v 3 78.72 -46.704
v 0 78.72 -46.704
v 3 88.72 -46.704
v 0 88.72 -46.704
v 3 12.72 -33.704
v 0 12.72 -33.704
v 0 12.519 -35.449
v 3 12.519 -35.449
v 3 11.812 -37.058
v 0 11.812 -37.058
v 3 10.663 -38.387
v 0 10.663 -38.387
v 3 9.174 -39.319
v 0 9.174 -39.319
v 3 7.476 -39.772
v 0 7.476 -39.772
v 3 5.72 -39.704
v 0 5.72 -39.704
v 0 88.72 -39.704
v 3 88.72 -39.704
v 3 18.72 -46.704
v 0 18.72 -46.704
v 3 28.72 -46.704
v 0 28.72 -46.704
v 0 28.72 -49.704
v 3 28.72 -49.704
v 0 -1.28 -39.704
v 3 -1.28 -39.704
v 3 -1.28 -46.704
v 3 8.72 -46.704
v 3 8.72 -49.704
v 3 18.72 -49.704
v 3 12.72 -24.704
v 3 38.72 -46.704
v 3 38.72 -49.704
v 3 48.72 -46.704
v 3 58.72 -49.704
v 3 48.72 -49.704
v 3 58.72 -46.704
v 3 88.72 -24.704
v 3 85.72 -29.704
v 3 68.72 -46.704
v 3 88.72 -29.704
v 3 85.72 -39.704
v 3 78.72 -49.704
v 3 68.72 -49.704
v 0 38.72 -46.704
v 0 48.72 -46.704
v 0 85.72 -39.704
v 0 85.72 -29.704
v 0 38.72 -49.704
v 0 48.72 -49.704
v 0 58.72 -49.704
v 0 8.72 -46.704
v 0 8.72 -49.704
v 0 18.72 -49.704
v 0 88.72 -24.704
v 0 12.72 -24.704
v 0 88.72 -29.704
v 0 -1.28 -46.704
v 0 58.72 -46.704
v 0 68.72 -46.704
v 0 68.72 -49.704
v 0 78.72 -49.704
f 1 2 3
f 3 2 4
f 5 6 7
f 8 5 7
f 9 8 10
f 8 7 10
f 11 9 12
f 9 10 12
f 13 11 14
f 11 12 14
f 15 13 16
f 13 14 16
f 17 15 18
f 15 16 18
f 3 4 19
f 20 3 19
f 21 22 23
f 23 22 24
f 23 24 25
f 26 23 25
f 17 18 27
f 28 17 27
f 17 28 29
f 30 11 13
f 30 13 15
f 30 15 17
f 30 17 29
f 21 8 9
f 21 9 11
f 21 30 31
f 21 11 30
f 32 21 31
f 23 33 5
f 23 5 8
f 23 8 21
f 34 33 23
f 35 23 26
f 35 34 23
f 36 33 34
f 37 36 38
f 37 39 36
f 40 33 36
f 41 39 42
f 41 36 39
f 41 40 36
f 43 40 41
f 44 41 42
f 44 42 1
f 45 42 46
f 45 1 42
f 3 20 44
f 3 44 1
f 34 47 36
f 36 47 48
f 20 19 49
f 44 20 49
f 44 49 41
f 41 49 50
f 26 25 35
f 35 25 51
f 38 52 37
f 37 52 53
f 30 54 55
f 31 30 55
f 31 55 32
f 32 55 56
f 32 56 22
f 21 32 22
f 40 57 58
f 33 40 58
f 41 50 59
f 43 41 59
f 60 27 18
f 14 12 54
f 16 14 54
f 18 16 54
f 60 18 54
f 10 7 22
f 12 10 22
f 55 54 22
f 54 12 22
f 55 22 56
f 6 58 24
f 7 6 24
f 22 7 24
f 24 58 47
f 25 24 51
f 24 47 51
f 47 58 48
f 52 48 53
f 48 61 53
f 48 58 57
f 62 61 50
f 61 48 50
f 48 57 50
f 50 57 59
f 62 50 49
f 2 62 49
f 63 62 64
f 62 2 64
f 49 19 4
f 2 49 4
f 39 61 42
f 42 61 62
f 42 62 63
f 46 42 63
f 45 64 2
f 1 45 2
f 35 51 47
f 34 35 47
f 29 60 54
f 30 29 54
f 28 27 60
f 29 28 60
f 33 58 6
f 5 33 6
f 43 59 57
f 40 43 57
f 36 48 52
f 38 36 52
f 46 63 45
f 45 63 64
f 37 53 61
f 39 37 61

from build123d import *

# Parameters (mm, degrees)
BOSS_EXTRUDE1_DEPTH = 3


with BuildPart() as part:
    # Sketch1 → Boss-Extrude1 (new body)
    with BuildSketch(Plane(origin=(0, 0, 0), x_dir=(0, 0, -1), z_dir=(1, 0, 0))):
        with BuildLine():
            Line((24.704010852, 12.720489708), (33.704010852, 12.720489708))
            ThreePointArc((33.704010852, 12.720489708), (38.387131684, 10.663164706), (39.704010852, 5.720489708))
            Line((39.704010852, 5.720489708), (39.704010852, -1.279510292))
            Line((39.704010852, -1.279510292), (46.704010852, -1.279510292))
            Line((46.704010852, -1.279510292), (46.704010852, 8.720489708))
            Line((46.704010852, 8.720489708), (49.704010852, 8.720489708))
            Line((49.704010852, 8.720489708), (49.704010852, 18.720489708))
            Line((49.704010852, 18.720489708), (46.704010852, 18.720489708))
            Line((46.704010852, 18.720489708), (46.704010852, 28.720489708))
            Line((46.704010852, 28.720489708), (49.704010852, 28.720489708))
            Line((49.704010852, 28.720489708), (49.704010852, 38.720489708))
            Line((49.704010852, 38.720489708), (46.704010852, 38.720489708))
            Line((46.704010852, 38.720489708), (46.704010852, 48.720489708))
            Line((46.704010852, 48.720489708), (49.704010852, 48.720489708))
            Line((49.704010852, 48.720489708), (49.704010852, 58.720489708))
            Line((49.704010852, 58.720489708), (46.704010852, 58.720489708))
            Line((46.704010852, 58.720489708), (46.704010852, 68.720489708))
            Line((46.704010852, 68.720489708), (49.704010852, 68.720489708))
            Line((49.704010852, 68.720489708), (49.704010852, 78.720489708))
            Line((49.704010852, 78.720489708), (46.704010852, 78.720489708))
            Line((46.704010852, 78.720489708), (46.704010852, 88.720489708))
            Line((46.704010852, 88.720489708), (39.704010852, 88.720489708))
            Line((39.704010852, 88.720489708), (39.704010852, 85.720489708))
            Line((39.704010852, 85.720489708), (29.704010852, 85.720489708))
            Line((29.704010852, 85.720489708), (29.704010852, 88.720489708))
            Line((29.704010852, 88.720489708), (24.704010852, 88.720489708))
            Line((24.704010852, 88.720489708), (24.704010852, 12.720489708))
        make_face()
    extrude(amount=BOSS_EXTRUDE1_DEPTH)


solid = part.part
